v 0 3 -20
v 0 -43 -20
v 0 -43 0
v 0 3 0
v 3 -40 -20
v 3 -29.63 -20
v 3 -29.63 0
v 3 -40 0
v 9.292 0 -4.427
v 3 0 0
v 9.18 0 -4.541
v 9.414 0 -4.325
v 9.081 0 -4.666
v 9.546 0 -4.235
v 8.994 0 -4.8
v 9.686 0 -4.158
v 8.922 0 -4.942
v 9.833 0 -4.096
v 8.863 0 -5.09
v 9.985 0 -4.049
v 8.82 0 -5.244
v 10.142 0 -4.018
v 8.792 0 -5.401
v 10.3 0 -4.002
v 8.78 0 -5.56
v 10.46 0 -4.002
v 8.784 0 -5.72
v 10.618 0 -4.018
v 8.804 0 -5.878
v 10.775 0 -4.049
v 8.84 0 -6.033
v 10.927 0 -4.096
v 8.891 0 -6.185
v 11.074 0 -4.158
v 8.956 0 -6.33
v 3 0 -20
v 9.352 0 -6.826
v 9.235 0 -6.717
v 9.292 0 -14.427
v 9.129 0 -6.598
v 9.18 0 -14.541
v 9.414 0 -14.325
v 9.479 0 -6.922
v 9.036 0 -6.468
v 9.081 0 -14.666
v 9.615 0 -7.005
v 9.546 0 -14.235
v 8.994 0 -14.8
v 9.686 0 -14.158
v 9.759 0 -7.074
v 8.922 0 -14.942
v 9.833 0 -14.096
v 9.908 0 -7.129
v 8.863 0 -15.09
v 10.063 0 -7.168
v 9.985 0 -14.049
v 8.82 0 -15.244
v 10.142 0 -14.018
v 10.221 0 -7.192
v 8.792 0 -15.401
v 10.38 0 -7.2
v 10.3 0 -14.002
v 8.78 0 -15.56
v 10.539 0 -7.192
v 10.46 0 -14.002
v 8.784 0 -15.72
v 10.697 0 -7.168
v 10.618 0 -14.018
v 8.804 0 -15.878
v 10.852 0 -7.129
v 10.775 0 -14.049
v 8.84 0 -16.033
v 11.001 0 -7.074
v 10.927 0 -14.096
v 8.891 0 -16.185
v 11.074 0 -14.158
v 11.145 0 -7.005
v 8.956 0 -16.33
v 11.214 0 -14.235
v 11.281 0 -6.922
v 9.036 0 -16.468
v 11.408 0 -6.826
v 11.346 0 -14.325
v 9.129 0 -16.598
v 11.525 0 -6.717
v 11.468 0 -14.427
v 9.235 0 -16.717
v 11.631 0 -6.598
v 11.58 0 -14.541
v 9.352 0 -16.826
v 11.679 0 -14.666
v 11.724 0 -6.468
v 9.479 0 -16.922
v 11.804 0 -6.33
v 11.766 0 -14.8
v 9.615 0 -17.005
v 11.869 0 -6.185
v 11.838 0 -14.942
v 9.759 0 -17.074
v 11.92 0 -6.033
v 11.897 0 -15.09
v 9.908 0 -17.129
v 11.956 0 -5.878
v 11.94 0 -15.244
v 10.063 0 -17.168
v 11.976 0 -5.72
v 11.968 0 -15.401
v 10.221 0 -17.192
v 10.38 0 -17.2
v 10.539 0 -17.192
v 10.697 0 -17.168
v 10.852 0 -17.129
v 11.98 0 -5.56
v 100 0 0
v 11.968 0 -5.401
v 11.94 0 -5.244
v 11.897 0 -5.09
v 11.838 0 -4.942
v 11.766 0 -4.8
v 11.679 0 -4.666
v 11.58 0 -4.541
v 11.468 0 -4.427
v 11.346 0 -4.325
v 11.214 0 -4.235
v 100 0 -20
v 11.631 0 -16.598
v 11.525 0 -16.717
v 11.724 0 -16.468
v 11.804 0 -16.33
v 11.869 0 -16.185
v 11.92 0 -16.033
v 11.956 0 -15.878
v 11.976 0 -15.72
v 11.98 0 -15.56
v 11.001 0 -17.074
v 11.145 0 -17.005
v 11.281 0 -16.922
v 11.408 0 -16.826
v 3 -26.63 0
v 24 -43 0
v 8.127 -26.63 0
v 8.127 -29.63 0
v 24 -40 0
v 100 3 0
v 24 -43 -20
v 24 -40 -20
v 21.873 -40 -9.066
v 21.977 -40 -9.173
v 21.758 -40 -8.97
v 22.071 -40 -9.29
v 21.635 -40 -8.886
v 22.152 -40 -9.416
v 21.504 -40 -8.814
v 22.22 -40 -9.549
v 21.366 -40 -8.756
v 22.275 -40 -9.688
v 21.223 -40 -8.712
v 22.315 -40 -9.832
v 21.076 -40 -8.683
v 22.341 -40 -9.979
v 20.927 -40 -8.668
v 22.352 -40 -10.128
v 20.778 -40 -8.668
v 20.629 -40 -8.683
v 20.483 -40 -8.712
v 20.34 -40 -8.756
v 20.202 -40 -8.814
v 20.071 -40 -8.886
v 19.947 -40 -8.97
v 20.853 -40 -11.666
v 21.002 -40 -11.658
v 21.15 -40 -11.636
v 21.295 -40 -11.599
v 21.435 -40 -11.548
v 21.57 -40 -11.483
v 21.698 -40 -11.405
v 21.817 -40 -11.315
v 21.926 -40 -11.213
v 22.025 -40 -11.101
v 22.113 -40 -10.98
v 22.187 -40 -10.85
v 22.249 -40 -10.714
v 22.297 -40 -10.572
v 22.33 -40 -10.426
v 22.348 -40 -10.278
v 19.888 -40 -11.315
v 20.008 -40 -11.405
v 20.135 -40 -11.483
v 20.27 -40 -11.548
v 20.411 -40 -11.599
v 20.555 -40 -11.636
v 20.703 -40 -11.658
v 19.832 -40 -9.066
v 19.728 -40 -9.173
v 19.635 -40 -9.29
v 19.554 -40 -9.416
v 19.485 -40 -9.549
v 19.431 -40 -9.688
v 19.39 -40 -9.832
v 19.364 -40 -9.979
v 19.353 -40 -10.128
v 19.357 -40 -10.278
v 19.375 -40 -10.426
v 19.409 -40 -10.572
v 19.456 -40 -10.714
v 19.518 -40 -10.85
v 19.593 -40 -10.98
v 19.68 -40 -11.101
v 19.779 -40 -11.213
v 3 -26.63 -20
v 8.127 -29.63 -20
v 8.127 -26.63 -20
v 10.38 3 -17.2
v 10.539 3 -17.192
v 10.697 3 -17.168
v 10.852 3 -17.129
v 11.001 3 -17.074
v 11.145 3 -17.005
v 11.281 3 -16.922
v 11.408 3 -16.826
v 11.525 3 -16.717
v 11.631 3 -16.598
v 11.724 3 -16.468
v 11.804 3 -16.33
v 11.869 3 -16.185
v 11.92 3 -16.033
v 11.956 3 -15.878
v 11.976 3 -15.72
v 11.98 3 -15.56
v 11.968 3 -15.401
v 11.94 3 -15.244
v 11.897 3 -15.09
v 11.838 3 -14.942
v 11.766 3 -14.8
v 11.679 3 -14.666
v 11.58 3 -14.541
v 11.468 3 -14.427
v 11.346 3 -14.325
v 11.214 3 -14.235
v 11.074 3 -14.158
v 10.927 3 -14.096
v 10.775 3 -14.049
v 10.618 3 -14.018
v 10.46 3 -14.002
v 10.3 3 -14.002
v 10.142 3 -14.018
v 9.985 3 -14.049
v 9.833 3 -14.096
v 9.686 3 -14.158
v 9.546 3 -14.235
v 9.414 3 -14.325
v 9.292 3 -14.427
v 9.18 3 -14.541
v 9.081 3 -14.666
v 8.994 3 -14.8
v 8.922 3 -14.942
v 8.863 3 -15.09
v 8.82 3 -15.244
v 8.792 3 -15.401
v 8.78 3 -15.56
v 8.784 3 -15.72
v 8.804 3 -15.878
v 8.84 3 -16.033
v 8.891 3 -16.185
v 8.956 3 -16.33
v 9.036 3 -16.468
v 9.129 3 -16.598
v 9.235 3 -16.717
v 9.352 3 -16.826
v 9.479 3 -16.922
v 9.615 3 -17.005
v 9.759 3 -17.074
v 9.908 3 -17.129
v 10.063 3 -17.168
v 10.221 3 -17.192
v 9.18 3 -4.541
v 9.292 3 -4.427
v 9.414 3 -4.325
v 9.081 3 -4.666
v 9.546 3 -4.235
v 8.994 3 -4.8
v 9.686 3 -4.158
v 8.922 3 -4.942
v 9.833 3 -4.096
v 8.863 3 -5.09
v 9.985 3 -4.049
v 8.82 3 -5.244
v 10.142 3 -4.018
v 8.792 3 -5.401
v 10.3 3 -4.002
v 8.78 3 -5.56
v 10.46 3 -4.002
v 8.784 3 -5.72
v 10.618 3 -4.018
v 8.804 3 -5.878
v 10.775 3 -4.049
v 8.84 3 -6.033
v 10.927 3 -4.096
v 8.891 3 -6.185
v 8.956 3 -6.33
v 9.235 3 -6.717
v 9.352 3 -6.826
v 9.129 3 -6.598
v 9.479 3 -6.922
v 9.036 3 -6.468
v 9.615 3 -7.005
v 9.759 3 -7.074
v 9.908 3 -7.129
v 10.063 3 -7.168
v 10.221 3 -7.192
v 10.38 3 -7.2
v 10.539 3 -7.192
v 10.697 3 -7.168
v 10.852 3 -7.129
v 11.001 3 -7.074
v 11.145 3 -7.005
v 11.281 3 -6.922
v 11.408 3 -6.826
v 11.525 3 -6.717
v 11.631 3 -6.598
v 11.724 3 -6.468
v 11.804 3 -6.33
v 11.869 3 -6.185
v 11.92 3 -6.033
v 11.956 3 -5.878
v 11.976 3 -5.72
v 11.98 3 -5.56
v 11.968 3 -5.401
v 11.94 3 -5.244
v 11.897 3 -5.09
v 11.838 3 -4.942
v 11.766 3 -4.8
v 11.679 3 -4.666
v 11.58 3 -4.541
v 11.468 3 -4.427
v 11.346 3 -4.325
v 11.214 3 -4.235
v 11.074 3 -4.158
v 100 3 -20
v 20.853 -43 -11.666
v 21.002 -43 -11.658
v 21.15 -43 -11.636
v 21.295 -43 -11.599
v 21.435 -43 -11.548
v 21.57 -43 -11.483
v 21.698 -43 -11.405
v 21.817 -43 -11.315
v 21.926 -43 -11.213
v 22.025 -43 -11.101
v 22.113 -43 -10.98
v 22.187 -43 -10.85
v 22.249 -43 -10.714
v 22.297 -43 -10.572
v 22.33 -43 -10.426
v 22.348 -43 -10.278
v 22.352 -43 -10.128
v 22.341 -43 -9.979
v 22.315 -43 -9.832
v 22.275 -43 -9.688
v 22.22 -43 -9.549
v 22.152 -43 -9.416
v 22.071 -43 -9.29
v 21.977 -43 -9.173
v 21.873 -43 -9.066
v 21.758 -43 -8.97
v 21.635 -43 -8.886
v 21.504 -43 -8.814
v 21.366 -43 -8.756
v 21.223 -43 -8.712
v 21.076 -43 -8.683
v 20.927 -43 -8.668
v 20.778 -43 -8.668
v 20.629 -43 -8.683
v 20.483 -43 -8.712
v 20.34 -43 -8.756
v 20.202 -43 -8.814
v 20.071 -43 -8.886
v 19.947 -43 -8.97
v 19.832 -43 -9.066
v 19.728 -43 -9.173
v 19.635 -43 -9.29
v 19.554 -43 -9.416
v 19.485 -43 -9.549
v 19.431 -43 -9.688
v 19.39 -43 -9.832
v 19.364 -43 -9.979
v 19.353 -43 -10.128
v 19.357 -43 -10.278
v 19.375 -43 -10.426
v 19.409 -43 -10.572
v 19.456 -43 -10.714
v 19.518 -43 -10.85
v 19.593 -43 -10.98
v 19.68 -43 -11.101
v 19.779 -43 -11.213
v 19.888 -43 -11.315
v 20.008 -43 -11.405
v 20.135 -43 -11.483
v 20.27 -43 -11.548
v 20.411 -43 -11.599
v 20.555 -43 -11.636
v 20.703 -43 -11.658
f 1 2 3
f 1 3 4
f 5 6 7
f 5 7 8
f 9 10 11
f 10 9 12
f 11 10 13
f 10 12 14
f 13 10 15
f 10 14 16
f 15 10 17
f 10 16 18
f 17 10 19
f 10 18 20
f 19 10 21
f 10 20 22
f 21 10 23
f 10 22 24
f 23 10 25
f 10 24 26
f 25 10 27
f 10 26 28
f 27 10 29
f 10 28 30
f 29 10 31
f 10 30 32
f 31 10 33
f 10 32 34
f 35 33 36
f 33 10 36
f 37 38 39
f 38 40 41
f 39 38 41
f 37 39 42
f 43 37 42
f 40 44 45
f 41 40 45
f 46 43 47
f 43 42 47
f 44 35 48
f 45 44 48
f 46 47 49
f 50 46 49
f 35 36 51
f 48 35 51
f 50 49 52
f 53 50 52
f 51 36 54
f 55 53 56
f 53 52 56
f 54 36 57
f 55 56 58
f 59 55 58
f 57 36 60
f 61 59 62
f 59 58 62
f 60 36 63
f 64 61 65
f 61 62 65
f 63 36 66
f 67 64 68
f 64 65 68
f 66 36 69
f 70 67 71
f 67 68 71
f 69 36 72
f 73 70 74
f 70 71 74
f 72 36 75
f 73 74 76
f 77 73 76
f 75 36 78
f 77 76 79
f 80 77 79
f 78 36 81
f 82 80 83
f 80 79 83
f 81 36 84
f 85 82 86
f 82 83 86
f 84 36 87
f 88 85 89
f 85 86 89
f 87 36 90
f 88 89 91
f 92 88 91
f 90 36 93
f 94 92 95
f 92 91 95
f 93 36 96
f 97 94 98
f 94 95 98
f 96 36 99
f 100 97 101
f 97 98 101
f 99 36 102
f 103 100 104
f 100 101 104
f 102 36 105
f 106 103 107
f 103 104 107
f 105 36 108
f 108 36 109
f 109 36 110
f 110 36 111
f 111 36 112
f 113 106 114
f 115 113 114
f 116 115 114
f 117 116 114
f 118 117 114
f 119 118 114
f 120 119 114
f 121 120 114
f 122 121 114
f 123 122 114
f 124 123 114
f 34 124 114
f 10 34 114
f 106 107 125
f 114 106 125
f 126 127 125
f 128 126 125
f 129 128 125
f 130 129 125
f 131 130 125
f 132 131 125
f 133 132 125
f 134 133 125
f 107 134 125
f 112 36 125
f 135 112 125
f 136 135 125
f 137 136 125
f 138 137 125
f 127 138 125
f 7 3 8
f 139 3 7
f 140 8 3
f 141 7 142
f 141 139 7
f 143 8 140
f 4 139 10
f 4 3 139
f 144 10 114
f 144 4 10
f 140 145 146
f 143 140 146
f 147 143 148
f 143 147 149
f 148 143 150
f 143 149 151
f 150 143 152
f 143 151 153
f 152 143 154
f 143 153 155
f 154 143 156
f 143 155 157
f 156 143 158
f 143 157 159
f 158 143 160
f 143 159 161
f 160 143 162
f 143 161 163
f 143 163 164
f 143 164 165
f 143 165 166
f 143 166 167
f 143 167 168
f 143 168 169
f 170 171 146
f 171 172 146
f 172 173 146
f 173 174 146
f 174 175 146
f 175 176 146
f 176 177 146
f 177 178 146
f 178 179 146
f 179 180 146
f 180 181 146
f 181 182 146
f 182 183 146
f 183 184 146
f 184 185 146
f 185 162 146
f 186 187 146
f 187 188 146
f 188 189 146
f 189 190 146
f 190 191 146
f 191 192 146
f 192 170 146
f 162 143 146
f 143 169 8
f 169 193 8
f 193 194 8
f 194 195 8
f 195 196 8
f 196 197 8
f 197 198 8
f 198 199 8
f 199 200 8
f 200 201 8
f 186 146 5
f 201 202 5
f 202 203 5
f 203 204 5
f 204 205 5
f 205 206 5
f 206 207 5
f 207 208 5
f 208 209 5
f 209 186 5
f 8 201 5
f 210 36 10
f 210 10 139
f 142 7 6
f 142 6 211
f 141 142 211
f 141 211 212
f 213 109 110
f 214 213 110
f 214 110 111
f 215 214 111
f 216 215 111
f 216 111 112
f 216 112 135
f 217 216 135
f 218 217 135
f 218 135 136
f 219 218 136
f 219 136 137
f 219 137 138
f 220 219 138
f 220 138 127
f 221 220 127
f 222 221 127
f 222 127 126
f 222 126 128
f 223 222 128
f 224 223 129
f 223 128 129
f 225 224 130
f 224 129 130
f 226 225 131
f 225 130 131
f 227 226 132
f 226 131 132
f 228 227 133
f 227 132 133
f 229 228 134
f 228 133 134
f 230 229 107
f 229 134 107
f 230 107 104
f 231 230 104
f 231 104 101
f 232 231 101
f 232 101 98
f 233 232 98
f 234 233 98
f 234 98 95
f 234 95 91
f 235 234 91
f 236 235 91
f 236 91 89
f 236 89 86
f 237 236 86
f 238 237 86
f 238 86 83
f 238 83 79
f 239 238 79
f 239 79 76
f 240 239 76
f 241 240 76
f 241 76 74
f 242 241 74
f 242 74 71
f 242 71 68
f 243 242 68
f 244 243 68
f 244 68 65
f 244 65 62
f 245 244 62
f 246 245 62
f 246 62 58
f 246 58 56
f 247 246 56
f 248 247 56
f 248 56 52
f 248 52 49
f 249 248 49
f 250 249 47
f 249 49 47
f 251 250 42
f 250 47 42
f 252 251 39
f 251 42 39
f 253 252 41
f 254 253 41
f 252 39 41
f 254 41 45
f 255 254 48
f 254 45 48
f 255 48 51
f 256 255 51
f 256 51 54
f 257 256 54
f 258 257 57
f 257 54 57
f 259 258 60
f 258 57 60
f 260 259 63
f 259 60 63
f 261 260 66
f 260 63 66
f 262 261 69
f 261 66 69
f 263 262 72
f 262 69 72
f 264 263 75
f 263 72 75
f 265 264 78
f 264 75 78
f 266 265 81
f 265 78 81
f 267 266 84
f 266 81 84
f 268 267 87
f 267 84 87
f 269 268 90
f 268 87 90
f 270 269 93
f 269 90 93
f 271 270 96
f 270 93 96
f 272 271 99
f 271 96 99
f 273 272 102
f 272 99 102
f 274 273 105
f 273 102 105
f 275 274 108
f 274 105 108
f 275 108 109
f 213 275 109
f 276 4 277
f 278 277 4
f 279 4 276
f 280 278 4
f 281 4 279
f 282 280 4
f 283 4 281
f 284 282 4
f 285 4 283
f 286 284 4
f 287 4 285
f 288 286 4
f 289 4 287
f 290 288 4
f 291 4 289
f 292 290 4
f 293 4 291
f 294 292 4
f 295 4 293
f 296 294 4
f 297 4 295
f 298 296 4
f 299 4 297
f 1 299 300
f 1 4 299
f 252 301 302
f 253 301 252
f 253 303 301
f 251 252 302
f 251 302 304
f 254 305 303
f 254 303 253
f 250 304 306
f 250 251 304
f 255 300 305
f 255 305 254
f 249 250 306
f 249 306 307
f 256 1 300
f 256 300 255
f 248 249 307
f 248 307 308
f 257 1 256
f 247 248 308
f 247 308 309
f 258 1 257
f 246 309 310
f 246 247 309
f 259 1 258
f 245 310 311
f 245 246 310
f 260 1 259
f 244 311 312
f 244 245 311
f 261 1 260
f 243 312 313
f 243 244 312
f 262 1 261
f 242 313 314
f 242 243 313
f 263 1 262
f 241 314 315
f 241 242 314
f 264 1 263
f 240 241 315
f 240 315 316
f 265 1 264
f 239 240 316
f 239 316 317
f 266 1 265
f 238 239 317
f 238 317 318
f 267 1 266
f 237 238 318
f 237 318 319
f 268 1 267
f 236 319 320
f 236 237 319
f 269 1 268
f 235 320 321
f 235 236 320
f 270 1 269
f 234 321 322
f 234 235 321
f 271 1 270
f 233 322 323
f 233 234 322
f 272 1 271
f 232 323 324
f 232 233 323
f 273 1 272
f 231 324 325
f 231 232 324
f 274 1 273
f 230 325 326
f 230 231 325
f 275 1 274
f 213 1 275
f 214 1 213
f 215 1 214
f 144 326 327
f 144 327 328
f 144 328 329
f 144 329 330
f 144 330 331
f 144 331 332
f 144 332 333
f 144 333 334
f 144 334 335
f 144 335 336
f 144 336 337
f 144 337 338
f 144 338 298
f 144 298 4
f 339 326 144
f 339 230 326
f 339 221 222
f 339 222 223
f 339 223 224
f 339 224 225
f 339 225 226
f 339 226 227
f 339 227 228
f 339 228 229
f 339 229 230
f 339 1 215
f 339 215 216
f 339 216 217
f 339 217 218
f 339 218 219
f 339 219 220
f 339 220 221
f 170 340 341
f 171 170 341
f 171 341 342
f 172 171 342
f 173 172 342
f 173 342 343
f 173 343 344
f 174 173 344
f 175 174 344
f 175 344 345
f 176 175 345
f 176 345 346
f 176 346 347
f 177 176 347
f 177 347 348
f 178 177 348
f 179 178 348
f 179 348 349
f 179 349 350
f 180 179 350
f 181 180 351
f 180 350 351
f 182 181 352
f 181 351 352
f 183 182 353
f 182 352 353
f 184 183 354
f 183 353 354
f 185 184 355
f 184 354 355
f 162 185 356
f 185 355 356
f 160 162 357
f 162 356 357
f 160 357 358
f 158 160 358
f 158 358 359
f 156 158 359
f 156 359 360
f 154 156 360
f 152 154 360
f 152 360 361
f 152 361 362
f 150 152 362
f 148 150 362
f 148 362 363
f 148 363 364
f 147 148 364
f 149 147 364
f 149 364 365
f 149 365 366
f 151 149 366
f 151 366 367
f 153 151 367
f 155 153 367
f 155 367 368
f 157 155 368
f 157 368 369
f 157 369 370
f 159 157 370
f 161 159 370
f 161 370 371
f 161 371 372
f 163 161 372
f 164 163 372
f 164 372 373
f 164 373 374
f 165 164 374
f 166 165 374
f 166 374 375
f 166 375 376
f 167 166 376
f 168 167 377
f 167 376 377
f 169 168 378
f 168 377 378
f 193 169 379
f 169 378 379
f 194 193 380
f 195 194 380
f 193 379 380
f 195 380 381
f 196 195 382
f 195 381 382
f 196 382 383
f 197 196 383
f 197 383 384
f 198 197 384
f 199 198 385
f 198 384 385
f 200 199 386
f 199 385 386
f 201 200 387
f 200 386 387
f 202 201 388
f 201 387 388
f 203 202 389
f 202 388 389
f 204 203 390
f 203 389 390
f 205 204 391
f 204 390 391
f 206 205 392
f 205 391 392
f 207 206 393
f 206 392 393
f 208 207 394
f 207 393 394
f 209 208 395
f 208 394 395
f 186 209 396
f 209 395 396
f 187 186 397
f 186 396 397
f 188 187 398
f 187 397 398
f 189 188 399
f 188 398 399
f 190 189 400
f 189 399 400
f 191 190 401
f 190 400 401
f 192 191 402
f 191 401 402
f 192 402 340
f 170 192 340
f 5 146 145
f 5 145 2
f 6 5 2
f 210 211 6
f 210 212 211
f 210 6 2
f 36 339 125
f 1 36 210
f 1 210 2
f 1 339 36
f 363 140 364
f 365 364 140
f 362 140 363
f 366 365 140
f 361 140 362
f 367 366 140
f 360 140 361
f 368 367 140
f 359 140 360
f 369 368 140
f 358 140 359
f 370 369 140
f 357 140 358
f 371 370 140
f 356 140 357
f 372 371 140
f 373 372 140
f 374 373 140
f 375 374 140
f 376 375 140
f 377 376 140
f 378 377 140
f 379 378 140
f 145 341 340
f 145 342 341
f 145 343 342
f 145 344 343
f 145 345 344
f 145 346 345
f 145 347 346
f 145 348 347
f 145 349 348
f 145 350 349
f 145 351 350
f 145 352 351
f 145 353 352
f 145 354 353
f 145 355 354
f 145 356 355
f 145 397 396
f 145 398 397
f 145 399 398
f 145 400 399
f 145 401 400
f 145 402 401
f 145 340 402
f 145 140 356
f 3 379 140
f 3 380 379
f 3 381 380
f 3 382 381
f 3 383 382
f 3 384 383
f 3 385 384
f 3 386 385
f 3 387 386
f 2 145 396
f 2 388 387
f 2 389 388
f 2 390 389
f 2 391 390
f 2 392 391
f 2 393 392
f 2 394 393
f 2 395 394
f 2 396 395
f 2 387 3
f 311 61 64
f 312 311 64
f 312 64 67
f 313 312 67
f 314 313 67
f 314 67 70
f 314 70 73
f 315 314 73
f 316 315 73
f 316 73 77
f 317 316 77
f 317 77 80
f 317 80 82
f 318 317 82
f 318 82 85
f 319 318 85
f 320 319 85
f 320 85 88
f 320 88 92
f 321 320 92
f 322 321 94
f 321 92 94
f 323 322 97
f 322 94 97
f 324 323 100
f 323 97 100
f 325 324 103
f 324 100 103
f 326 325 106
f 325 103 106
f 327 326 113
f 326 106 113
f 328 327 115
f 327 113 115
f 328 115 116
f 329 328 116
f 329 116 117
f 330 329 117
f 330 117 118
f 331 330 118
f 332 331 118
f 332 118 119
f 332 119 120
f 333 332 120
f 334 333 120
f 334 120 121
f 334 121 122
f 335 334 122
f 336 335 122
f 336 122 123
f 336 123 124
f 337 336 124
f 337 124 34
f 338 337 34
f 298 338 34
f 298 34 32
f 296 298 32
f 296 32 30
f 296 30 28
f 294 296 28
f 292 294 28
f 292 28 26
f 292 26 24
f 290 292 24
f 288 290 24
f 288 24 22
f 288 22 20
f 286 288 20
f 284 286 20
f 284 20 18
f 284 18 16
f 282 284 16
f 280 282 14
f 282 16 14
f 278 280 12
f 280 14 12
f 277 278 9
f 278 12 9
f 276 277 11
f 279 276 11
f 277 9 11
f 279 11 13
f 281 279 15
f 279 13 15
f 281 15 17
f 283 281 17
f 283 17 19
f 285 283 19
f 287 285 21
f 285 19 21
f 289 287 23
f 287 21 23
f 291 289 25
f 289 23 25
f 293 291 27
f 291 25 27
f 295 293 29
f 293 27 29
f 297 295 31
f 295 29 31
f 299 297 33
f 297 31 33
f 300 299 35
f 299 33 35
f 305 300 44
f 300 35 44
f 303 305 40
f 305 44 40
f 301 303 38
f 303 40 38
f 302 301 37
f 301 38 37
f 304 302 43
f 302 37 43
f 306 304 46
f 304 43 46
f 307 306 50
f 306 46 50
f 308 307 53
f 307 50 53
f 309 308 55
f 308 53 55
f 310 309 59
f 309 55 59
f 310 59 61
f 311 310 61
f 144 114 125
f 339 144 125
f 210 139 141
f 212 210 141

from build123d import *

# Parameters (mm, degrees)
SKETCH1_W            = 100
SKETCH1_H            = 20
BOSS_EXTRUDE1_DEPTH  = 3
BOSS_EXTRUDE3_DEPTH  = 20
SKETCH8_W            = 24
SKETCH8_H            = 3
BOSS_EXTRUDE6_DEPTH  = 20
SKETCH10_W           = 6
SKETCH10_H           = 3
BOSS_EXTRUDE9_DEPTH  = 20
SKETCH12_R           = 1.6
CUT_EXTRUDE1_DEPTH   = 80
SKETCH11_R           = 1.5
CUT_EXTRUDE2_DEPTH   = 20
SKETCH13_W           = 7.961309781
SKETCH13_H           = 15.301040779
BOSS_EXTRUDE10_DEPTH = 3


with BuildPart() as part:
    # Sketch1 → Boss-Extrude1 (new body)
    with BuildSketch(Plane(origin=(0, 0, 0), x_dir=(1, 0, 0), z_dir=(0, 1, 0))):
        with Locations((50, 10)):
            Rectangle(SKETCH1_W, SKETCH1_H)
    extrude(amount=BOSS_EXTRUDE1_DEPTH)

    # Sketch4 → Boss-Extrude3 (add)
    with BuildSketch(Plane(origin=(0, 0, -20), x_dir=(-1, 0, 0), z_dir=(0, 0, -1))):
        Polygon((0, -43), (0, 0), (-3, 0), (-3, -24), (-3, -26.692100843), (-3, -43), align=None)
    extrude(amount=-BOSS_EXTRUDE3_DEPTH)

    # Sketch8 → Boss-Extrude6 (add)
    with BuildSketch(Plane(origin=(0, 0, -20), x_dir=(-1, 0, 0), z_dir=(0, 0, -1))):
        with Locations((-12, -41.5)):
            Rectangle(SKETCH8_W, SKETCH8_H)
    extrude(amount=-BOSS_EXTRUDE6_DEPTH)

    # Sketch10 → Boss-Extrude9 (add)
    with BuildSketch(Plane.XY):
        with Locations((5.126533602, -28.13)):
            Rectangle(SKETCH10_W, SKETCH10_H)
    extrude(amount=-BOSS_EXTRUDE9_DEPTH)

    # Sketch12 → Cut-Extrude1 (cut)
    with BuildSketch(Plane(origin=(0, -43, 0), x_dir=(-1, 0, 0), z_dir=(0, -1, 0))):
        with Locations(Location((-10.38, 5.6, 0), (0, 0, 90))):
            Circle(SKETCH12_R)
        with Locations(Location((-10.38, 15.6, 0), (0, 0, 90))):
            Circle(SKETCH12_R)
    extrude(amount=-CUT_EXTRUDE1_DEPTH, mode=Mode.SUBTRACT)

    # Sketch11 → Cut-Extrude2 (cut)
    with BuildSketch(Plane.XZ.offset(43)):
        with Locations(Location((20.852680531, -10.165848845, 0), (0, 0, 270))):
            Circle(SKETCH11_R)
    extrude(amount=-CUT_EXTRUDE2_DEPTH, mode=Mode.SUBTRACT)

    # Sketch13 → Boss-Extrude10 (add)
    with BuildSketch(Plane.XZ.offset(43)):
        with Locations((9.051384729, -11.125007192)):
            Rectangle(SKETCH13_W, SKETCH13_H)
    extrude(amount=-BOSS_EXTRUDE10_DEPTH)


solid = part.part
